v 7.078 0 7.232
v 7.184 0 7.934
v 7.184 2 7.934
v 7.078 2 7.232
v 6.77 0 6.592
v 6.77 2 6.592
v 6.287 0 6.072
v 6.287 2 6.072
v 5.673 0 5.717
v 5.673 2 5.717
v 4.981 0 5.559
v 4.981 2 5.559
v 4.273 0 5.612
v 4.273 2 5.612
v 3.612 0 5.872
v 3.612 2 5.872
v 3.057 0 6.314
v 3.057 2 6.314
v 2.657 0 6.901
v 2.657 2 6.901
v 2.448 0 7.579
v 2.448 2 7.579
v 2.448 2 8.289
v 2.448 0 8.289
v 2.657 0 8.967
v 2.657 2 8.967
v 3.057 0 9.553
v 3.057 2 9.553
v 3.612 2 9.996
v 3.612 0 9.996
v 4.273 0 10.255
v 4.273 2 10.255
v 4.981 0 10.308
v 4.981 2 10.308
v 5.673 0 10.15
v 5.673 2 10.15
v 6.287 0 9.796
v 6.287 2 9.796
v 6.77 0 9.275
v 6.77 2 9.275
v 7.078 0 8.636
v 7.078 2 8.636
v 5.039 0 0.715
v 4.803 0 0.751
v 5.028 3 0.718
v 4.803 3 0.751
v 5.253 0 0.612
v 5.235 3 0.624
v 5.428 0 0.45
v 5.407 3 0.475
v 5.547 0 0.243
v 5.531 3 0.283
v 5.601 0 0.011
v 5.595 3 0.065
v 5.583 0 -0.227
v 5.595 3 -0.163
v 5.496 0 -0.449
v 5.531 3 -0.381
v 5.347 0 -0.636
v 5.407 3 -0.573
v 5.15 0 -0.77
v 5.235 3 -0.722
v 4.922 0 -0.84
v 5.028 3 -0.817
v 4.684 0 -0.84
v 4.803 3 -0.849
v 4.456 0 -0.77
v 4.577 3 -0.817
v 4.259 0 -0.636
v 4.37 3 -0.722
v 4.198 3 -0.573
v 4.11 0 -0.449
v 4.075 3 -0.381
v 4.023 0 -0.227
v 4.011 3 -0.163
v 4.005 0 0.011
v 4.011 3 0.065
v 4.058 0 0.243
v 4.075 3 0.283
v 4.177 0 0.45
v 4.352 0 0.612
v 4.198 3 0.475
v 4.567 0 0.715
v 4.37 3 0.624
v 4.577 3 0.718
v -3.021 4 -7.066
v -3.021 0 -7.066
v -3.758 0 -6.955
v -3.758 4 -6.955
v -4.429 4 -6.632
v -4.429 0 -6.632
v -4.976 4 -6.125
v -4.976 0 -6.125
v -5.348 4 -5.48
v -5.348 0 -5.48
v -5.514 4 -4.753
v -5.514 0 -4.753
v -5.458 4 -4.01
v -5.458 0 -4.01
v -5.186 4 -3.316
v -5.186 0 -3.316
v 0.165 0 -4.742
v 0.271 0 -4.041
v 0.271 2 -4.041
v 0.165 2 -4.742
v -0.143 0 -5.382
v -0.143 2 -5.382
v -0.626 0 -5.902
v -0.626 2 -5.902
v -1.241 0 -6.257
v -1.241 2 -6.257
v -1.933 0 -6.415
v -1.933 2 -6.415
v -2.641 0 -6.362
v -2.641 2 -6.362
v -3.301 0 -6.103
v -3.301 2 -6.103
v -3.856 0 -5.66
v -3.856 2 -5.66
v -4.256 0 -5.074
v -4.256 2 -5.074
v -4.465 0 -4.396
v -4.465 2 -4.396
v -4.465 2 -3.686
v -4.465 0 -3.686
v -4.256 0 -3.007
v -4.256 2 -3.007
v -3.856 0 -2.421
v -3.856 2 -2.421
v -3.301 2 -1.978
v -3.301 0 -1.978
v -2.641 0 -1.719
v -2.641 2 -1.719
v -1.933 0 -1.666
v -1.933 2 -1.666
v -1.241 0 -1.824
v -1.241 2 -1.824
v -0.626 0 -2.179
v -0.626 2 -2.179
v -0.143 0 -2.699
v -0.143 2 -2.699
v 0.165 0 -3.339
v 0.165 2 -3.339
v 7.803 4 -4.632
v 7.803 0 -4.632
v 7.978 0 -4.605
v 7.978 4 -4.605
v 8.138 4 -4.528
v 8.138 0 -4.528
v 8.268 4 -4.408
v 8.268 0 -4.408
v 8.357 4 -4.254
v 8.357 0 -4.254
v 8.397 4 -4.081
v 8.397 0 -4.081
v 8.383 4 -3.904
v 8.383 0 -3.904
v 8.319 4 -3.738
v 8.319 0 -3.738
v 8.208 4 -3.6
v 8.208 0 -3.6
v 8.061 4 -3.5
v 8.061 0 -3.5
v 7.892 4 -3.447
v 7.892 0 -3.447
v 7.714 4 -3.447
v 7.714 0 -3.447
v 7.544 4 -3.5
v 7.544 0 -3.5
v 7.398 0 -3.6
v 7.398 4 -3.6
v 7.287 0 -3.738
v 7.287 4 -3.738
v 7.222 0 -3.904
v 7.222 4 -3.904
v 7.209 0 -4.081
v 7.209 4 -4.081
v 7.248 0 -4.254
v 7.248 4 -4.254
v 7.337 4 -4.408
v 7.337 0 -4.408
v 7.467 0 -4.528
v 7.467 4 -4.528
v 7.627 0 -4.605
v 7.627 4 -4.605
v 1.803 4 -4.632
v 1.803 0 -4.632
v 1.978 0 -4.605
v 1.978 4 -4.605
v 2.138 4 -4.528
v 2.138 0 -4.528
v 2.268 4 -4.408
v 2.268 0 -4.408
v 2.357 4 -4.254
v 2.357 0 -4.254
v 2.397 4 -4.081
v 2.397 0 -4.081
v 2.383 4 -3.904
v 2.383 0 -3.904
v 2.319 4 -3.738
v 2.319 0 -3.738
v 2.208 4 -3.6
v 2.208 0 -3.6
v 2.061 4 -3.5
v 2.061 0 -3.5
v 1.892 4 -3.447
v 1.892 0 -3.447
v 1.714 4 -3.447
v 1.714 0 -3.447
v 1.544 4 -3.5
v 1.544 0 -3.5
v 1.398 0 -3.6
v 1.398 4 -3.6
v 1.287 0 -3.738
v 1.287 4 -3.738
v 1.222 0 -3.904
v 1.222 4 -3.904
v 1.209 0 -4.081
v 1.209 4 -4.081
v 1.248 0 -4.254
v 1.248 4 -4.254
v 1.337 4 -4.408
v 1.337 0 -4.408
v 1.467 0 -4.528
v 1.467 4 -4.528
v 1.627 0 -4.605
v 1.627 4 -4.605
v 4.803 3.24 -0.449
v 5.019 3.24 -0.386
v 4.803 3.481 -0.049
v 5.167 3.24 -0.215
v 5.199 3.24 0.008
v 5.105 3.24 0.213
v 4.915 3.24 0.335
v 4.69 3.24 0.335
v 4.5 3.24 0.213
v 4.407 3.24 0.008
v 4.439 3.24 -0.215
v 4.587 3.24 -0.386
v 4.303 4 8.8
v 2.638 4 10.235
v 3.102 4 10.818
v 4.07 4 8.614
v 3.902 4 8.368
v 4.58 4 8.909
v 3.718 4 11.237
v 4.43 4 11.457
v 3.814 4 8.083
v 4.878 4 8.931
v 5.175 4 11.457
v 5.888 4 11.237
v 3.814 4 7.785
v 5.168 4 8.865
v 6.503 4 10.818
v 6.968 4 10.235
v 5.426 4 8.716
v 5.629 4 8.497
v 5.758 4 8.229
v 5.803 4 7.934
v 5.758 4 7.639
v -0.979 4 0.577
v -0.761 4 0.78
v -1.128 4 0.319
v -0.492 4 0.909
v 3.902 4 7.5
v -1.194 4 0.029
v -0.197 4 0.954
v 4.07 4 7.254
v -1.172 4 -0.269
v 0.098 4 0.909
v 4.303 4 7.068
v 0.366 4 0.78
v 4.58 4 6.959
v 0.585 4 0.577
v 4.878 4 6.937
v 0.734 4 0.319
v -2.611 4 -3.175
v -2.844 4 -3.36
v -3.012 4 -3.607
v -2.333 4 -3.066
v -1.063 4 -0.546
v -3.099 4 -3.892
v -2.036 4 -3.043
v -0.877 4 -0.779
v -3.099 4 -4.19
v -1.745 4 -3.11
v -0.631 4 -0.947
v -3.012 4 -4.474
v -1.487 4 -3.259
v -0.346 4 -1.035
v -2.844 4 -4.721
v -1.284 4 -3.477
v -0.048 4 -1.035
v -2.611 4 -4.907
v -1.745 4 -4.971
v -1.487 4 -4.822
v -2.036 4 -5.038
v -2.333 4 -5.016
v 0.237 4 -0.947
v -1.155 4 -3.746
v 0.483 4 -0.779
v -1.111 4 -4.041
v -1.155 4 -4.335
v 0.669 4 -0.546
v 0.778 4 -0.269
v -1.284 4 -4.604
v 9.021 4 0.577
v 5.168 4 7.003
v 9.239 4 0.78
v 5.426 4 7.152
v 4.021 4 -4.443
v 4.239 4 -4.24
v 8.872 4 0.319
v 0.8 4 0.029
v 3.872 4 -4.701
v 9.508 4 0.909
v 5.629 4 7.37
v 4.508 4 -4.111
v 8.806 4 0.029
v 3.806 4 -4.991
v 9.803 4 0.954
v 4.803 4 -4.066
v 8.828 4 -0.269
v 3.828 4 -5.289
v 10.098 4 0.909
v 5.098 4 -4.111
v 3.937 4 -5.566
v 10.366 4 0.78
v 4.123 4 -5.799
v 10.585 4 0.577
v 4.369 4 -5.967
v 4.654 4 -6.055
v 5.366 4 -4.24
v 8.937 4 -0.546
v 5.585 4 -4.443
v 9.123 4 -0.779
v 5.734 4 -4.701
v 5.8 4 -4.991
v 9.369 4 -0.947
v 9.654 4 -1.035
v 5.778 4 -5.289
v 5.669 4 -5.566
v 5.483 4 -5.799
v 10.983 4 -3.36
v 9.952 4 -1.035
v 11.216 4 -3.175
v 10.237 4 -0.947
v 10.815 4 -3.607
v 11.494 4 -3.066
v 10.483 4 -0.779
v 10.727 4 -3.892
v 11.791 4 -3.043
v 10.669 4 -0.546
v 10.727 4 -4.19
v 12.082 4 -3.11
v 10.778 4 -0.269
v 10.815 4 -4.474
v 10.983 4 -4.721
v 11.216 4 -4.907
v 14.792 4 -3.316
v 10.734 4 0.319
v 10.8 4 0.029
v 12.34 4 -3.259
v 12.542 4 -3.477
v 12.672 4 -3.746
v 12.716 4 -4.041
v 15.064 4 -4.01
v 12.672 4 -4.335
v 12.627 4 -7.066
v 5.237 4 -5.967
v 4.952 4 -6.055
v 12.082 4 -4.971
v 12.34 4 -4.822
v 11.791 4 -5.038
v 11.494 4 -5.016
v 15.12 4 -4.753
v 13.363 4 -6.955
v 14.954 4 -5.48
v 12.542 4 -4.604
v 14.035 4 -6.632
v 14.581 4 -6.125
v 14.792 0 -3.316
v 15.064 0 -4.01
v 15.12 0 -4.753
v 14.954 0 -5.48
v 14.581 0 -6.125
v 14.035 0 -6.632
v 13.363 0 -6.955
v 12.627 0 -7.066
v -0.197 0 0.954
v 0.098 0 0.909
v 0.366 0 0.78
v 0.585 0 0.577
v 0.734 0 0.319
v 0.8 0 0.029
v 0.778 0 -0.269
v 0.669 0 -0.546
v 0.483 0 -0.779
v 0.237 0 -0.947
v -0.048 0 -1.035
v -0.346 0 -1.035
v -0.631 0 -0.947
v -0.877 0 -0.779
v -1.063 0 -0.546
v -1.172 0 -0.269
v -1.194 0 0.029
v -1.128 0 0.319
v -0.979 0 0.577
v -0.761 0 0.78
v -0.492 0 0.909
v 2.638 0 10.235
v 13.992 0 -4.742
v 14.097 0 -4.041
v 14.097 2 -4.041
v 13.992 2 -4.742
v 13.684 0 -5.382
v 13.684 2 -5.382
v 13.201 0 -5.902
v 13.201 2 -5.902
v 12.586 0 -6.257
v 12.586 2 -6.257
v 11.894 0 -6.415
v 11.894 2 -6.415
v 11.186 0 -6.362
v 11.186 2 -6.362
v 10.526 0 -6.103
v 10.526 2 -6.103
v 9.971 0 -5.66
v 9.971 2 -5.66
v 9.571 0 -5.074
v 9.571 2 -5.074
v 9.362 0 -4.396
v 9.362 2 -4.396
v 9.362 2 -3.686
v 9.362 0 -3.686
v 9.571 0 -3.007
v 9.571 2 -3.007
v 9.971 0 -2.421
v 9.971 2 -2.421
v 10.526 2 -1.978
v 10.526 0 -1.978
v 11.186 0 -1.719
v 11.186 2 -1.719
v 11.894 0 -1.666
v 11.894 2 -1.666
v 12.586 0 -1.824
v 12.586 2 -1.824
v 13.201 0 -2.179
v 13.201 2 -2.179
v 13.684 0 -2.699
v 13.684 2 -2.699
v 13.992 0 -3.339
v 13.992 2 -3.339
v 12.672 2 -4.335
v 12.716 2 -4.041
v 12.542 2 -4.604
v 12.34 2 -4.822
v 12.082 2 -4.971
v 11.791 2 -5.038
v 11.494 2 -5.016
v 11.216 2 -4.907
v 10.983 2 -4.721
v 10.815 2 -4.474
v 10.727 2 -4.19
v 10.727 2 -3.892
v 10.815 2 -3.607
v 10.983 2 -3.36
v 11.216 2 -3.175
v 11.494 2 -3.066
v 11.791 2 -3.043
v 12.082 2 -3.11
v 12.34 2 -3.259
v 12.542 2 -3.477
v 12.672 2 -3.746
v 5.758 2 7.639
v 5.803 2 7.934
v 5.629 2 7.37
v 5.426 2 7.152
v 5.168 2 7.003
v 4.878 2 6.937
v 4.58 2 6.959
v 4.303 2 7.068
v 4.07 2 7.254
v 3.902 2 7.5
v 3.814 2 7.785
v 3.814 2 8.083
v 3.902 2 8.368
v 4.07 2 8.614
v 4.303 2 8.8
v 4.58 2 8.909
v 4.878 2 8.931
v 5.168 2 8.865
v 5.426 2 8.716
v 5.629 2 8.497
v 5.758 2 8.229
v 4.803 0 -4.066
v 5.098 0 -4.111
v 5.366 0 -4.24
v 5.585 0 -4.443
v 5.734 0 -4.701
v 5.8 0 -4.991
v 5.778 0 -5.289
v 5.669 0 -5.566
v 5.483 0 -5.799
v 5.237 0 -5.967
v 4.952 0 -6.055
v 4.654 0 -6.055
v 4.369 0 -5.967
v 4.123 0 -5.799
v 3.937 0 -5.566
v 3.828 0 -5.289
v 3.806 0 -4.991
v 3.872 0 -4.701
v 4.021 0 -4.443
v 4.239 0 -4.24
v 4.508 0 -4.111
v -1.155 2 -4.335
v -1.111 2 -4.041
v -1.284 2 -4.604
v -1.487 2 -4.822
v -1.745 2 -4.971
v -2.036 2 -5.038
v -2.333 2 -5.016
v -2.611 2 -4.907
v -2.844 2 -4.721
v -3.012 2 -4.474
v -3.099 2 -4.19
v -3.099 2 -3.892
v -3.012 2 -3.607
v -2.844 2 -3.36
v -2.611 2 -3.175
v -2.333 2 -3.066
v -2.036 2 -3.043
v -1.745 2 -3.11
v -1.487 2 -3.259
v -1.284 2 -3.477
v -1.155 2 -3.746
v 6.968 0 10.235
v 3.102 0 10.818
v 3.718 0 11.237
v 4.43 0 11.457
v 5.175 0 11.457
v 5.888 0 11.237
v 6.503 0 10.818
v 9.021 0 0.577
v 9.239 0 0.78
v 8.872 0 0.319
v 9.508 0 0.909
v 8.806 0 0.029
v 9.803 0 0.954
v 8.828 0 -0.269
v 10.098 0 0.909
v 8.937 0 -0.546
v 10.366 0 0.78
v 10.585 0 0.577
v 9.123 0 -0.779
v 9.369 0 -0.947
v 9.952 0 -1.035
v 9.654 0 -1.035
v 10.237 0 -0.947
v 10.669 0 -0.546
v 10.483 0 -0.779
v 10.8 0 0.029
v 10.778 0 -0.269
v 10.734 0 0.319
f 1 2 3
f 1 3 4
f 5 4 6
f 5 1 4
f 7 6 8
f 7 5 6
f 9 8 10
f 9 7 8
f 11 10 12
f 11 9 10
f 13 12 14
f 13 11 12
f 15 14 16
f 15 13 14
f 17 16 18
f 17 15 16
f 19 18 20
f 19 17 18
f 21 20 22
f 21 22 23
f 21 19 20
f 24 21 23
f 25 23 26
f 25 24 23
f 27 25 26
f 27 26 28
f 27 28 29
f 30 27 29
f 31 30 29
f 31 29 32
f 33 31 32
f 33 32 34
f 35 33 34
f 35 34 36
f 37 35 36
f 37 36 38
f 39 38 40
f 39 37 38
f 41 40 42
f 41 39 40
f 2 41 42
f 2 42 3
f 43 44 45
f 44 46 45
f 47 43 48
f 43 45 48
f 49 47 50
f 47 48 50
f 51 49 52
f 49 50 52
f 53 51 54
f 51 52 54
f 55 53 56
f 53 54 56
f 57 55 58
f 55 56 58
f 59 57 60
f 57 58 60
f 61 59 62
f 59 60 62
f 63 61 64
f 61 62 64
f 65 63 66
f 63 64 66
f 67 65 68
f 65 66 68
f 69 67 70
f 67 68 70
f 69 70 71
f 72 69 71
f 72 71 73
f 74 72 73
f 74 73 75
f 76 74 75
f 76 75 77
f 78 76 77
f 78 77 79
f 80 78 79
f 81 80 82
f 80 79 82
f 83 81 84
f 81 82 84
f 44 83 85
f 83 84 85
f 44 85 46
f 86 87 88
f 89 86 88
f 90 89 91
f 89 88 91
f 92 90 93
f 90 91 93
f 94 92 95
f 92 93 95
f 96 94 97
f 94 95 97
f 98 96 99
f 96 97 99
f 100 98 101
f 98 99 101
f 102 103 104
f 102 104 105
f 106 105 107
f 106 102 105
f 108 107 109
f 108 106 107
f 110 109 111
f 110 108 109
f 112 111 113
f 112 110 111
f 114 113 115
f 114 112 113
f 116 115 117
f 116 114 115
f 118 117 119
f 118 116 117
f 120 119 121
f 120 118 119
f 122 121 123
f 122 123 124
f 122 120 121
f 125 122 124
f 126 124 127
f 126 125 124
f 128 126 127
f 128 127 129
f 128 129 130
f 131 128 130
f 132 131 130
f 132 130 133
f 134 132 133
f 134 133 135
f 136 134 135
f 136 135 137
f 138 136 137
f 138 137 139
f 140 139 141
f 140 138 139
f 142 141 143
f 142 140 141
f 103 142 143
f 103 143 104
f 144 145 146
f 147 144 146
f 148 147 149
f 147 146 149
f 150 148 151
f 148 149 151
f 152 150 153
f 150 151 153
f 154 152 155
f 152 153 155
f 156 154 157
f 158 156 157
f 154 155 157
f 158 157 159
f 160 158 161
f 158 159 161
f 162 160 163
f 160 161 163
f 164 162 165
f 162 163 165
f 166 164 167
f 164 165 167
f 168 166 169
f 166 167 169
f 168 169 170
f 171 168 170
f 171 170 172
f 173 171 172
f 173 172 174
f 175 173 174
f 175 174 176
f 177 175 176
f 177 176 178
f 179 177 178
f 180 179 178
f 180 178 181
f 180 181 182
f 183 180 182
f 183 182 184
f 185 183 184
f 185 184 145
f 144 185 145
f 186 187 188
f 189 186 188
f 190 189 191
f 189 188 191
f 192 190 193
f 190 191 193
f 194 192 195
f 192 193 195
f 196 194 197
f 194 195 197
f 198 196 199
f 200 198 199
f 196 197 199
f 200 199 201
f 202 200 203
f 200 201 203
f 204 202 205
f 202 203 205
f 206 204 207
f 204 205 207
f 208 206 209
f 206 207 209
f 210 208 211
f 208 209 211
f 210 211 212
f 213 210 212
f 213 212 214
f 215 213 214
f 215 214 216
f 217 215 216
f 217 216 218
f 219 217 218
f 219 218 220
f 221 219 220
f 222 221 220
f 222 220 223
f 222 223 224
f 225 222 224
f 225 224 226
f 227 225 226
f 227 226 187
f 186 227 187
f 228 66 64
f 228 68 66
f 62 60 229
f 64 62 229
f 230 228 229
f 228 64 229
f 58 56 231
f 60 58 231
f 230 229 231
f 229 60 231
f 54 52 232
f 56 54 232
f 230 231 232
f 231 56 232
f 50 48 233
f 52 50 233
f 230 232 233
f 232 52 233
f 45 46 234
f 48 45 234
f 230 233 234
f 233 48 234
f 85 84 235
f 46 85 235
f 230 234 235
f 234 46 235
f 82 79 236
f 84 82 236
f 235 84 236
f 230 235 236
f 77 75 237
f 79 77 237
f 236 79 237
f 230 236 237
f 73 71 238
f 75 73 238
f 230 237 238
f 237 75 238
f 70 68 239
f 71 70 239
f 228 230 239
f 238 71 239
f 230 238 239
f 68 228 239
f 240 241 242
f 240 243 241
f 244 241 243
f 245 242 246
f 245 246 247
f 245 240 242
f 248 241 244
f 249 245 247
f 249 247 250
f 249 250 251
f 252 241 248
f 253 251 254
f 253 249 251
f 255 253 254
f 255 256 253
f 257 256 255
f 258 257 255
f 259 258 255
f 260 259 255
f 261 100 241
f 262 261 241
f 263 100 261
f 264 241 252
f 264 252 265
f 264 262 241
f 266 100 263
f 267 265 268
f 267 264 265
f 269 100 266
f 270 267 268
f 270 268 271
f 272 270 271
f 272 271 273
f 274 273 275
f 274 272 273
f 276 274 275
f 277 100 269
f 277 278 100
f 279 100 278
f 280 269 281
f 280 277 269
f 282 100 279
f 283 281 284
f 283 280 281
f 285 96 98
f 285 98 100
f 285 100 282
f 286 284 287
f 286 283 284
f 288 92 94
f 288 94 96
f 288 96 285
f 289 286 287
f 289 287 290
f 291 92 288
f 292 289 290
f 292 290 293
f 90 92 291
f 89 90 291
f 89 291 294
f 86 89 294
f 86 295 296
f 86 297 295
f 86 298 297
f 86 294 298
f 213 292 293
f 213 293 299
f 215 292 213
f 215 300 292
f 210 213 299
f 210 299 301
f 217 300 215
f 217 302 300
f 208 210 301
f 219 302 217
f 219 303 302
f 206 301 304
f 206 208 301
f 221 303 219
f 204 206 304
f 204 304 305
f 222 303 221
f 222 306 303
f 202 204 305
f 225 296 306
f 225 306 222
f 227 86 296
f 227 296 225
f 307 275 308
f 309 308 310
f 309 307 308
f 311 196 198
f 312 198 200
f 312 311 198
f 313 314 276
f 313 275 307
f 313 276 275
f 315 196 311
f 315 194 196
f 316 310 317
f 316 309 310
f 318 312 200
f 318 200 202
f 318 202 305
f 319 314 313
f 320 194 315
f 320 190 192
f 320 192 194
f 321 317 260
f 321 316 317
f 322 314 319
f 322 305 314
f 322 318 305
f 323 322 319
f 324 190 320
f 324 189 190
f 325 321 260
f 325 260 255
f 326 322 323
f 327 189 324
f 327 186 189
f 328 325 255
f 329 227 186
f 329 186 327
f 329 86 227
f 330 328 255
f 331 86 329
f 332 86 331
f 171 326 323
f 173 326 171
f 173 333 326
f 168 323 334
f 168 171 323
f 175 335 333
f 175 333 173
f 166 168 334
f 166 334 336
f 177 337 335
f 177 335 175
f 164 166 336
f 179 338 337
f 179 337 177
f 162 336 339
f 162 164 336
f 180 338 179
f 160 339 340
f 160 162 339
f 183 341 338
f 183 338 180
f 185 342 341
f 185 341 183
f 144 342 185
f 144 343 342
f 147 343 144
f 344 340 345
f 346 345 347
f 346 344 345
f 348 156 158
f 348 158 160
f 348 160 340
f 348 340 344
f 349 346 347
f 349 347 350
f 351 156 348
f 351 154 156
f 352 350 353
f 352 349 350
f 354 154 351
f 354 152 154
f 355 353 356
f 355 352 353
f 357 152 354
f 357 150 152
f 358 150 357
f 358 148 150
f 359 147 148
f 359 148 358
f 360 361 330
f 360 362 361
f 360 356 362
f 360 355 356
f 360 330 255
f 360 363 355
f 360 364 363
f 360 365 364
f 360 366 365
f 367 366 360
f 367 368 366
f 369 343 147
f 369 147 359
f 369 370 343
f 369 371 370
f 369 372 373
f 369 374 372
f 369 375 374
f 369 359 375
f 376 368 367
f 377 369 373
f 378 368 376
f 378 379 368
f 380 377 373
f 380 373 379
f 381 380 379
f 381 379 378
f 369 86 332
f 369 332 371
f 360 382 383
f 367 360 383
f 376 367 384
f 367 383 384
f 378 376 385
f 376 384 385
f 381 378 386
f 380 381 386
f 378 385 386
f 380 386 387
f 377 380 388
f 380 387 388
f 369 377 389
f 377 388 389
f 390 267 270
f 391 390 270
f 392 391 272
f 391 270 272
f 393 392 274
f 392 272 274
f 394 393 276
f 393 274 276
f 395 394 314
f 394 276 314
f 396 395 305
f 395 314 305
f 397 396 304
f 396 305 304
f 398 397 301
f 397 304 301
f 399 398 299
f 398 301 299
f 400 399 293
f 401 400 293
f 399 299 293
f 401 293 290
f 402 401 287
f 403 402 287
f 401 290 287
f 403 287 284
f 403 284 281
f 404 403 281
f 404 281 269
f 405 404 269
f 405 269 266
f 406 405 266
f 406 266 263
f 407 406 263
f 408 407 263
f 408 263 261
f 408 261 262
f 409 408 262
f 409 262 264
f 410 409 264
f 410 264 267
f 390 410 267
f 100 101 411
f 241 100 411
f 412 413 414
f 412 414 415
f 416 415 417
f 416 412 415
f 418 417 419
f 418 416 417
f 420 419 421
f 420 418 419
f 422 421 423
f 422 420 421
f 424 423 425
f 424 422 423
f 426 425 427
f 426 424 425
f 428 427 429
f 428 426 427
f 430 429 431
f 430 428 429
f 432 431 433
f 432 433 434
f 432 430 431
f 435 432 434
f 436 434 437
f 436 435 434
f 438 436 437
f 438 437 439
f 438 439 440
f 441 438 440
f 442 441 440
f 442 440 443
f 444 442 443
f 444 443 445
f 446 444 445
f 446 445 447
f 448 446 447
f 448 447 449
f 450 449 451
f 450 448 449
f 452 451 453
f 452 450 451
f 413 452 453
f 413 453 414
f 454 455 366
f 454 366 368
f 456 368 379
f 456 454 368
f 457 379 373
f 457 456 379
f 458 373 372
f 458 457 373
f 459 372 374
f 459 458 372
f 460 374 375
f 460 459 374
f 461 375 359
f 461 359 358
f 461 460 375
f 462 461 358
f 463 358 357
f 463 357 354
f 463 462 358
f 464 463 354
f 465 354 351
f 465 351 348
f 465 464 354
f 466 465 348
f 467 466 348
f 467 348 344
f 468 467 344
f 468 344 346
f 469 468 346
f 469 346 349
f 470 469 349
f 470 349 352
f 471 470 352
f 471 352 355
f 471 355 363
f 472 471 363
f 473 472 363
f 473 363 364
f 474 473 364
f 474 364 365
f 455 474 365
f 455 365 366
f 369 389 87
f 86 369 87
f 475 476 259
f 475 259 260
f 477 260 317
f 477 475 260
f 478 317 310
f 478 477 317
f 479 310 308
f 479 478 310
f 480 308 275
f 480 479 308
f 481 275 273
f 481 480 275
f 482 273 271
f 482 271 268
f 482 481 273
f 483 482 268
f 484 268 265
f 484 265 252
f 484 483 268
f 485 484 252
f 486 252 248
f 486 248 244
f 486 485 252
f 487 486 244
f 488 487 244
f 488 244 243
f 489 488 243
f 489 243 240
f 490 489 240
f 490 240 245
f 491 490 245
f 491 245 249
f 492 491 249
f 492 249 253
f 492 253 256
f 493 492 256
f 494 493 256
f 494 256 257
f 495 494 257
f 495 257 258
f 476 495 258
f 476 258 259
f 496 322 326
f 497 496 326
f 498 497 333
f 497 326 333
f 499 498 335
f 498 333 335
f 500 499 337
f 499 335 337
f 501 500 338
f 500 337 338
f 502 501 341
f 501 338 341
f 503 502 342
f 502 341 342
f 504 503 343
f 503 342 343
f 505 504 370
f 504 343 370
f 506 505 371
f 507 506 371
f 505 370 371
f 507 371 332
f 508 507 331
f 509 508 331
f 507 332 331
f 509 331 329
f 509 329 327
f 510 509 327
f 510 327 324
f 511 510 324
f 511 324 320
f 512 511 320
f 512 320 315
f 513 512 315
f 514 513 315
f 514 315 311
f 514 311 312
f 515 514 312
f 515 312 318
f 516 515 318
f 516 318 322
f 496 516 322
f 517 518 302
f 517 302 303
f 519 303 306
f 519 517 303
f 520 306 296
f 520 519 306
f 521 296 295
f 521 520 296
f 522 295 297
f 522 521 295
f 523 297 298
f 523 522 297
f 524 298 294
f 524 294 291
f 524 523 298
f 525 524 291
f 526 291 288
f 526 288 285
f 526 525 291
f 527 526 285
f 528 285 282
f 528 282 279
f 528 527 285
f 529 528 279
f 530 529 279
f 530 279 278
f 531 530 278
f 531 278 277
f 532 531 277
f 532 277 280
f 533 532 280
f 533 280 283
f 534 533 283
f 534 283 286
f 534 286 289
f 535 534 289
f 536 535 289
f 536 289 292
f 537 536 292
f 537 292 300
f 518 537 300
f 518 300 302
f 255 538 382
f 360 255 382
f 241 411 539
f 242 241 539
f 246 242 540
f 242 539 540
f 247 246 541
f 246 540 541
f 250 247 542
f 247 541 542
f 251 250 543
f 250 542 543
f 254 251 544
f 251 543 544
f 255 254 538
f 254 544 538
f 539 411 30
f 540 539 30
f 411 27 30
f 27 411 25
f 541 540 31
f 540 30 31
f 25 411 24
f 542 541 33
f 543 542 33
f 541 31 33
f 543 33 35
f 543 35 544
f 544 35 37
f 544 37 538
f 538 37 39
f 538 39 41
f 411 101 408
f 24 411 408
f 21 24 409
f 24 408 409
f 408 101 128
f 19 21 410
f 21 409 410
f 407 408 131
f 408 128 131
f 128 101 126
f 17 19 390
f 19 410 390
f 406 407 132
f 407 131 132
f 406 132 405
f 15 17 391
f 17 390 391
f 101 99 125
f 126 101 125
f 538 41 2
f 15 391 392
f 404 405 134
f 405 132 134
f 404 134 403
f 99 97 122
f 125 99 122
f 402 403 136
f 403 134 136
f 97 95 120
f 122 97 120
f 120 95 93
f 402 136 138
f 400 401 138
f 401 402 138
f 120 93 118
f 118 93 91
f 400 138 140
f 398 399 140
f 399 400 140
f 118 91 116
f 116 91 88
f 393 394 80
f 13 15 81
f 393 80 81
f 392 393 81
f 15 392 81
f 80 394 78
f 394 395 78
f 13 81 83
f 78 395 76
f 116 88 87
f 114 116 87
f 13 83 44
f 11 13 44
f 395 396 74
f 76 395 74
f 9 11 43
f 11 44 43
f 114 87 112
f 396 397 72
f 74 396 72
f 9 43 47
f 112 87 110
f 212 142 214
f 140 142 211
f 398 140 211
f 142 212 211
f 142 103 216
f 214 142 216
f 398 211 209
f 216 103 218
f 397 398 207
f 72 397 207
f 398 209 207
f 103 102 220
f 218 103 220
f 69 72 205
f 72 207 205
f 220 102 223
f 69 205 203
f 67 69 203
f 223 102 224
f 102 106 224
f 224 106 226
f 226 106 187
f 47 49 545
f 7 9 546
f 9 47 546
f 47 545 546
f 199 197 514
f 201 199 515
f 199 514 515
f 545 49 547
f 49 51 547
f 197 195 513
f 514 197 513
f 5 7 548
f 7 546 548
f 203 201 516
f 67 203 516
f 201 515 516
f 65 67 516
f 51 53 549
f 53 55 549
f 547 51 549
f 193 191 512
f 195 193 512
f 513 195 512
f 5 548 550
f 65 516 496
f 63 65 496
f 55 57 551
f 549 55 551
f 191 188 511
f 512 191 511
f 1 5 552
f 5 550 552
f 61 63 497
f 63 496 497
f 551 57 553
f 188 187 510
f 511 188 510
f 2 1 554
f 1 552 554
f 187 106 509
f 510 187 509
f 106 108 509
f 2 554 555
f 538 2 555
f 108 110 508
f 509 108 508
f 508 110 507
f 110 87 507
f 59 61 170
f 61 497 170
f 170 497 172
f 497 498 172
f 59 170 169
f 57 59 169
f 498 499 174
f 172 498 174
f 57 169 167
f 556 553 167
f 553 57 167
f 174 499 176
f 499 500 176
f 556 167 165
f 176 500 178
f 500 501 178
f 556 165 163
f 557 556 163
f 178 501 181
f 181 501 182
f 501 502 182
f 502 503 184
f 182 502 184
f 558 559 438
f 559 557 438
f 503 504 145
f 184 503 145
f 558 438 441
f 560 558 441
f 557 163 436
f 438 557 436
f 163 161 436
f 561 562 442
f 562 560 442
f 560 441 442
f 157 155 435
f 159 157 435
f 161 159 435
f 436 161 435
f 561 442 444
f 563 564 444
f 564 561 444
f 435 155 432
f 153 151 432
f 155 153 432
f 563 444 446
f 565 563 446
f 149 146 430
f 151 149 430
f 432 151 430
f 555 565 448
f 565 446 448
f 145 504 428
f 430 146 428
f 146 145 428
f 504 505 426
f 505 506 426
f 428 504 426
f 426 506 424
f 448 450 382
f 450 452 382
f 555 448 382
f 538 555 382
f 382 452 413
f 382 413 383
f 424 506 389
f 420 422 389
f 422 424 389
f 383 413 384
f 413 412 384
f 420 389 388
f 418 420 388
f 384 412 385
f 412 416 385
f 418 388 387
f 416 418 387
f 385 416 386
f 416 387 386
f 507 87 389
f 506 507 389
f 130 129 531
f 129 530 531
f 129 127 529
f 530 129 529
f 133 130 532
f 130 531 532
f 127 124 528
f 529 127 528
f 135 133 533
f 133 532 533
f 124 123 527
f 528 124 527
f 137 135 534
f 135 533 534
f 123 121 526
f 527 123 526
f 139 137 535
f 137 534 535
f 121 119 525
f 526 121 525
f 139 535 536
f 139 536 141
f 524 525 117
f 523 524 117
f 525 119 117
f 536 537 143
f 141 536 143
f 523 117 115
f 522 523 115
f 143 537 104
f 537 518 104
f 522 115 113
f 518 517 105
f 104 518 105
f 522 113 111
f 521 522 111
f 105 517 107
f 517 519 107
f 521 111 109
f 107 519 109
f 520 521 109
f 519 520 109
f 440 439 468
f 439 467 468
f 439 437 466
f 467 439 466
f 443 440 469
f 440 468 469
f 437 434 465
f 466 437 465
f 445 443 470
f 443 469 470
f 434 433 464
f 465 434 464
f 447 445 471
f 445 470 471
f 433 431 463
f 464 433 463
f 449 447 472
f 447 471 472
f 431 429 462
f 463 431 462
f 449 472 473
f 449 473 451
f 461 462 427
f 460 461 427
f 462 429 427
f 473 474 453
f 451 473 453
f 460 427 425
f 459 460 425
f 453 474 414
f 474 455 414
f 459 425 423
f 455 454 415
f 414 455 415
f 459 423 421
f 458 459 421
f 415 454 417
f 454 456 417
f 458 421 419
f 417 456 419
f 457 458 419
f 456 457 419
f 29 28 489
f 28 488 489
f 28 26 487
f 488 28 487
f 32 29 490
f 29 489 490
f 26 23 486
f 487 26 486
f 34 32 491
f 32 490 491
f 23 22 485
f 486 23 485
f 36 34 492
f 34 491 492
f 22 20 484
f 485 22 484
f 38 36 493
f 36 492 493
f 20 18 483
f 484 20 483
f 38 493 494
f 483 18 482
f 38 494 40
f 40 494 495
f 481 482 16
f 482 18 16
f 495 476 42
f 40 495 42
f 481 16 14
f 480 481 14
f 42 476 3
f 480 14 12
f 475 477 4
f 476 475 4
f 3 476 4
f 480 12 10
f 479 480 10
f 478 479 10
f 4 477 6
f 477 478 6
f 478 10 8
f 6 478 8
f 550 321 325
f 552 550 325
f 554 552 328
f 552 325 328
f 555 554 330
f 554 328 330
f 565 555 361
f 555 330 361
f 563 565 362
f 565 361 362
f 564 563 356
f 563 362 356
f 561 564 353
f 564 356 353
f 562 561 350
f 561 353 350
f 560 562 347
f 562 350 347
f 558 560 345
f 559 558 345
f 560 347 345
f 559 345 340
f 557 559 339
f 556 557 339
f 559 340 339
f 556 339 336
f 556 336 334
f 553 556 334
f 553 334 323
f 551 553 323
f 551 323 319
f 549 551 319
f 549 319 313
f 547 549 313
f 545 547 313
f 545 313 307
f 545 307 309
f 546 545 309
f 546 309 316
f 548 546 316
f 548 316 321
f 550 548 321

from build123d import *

# Parameters (mm, degrees)
SKETCH1_R                    = 1
EXTRUDE1_DEPTH               = 4
SKETCH1_3_R                  = 2.38125
EXTRUDE4_DEPTH               = 2
M2X0_4_TAPPED_HOLE1_D        = 1.6
M2X0_4_TAPPED_HOLE1_DEPTH    = 3
M2X0_4_TAPPED_HOLE1_TIP      = 0.480688495
F_2_0_2_DIAMETER_HOLE1_D     = 2
F_2_0_2_DIAMETER_HOLE1_DEPTH = 10
F_2_0_2_DIAMETER_HOLE1_TIP   = 0.600860619
F_0_80_TAPPED_HOLE2_D        = 1.19126
F_0_80_TAPPED_HOLE2_DEPTH    = 4


with BuildPart() as part:
    # Sketch1 → Extrude1 (new body)
    with BuildSketch(Plane(origin=(0, 0, 0), x_dir=(1, 0, 0), z_dir=(0, 1, 0))):
        with BuildLine():
            Line((-5.186041147, 3.316192399), (2.637731834, -10.234979911))
            ThreePointArc((2.637731834, -10.234979911), (4.802795343, -11.484979911), (6.967858853, -10.234979911))
            Line((6.967858853, -10.234979911), (14.791631834, 3.316192399))
            ThreePointArc((14.791631834, 3.316192399), (14.791631834, 5.816192399), (12.626568324, 7.066192399))
            Line((12.626568324, 7.066192399), (-3.020977638, 7.066192399))
            ThreePointArc((-3.020977638, 7.066192399), (-5.186041147, 5.816192399), (-5.186041147, 3.316192399))
        make_face()
        with Locations((-2.110635714, 4.040606244)):
            Circle(SKETCH1_R, mode=Mode.SUBTRACT)
        with Locations((11.7162264, 4.040606244)):
            Circle(SKETCH1_R, mode=Mode.SUBTRACT)
        with Locations((4.802795343, -7.933807601)):
            Circle(SKETCH1_R, mode=Mode.SUBTRACT)
    extrude(amount=EXTRUDE1_DEPTH)

    # Sketch1<3> → Extrude4 (cut)
    with BuildSketch(Plane(origin=(0, 0, 0), x_dir=(1, 0, 0), z_dir=(0, 1, 0))):
        with Locations((4.802795343, -7.933807601)):
            Circle(SKETCH1_3_R)
        with Locations((11.7162264, 4.040606244)):
            Circle(SKETCH1_3_R)
        with Locations((-2.110635714, 4.040606244)):
            Circle(SKETCH1_3_R)
    extrude(amount=EXTRUDE4_DEPTH, mode=Mode.SUBTRACT)

    # M2x0.4 Tapped Hole1
    with Locations(Plane(origin=(4.802795343, 0, -0.049134963), x_dir=(0, 0, -1), z_dir=(0, -1, 0))):
        with Locations((0, 0)):
            Hole(M2X0_4_TAPPED_HOLE1_D / 2, depth=M2X0_4_TAPPED_HOLE1_DEPTH)
            with Locations((0, 0, -(M2X0_4_TAPPED_HOLE1_DEPTH + M2X0_4_TAPPED_HOLE1_TIP / 2))):  # 118° drill point
                Cone(0, M2X0_4_TAPPED_HOLE1_D / 2, M2X0_4_TAPPED_HOLE1_TIP, mode=Mode.SUBTRACT)

    # Ø2.0 (2) Diameter Hole1
    with Locations(Plane(origin=(4.802795343, 0, -5.066192399), x_dir=(0, 0, -1), z_dir=(0, -1, 0))):
        with Locations((0, 0), (-5.02, 5), (-5.02, -5)):
            Hole(F_2_0_2_DIAMETER_HOLE1_D / 2, depth=F_2_0_2_DIAMETER_HOLE1_DEPTH)
            with Locations((0, 0, -(F_2_0_2_DIAMETER_HOLE1_DEPTH + F_2_0_2_DIAMETER_HOLE1_TIP / 2))):  # 118° drill point
                Cone(0, F_2_0_2_DIAMETER_HOLE1_D / 2, F_2_0_2_DIAMETER_HOLE1_TIP, mode=Mode.SUBTRACT)

    # #0-80 Tapped Hole2
    with Locations(Plane(origin=(1.802795343, 4, -4.036192399), x_dir=(0, 0, 1), z_dir=(0, 1, 0))):
        with Locations((0, 0), (0, 6)):
            Hole(F_0_80_TAPPED_HOLE2_D / 2, depth=F_0_80_TAPPED_HOLE2_DEPTH)


solid = part.part
